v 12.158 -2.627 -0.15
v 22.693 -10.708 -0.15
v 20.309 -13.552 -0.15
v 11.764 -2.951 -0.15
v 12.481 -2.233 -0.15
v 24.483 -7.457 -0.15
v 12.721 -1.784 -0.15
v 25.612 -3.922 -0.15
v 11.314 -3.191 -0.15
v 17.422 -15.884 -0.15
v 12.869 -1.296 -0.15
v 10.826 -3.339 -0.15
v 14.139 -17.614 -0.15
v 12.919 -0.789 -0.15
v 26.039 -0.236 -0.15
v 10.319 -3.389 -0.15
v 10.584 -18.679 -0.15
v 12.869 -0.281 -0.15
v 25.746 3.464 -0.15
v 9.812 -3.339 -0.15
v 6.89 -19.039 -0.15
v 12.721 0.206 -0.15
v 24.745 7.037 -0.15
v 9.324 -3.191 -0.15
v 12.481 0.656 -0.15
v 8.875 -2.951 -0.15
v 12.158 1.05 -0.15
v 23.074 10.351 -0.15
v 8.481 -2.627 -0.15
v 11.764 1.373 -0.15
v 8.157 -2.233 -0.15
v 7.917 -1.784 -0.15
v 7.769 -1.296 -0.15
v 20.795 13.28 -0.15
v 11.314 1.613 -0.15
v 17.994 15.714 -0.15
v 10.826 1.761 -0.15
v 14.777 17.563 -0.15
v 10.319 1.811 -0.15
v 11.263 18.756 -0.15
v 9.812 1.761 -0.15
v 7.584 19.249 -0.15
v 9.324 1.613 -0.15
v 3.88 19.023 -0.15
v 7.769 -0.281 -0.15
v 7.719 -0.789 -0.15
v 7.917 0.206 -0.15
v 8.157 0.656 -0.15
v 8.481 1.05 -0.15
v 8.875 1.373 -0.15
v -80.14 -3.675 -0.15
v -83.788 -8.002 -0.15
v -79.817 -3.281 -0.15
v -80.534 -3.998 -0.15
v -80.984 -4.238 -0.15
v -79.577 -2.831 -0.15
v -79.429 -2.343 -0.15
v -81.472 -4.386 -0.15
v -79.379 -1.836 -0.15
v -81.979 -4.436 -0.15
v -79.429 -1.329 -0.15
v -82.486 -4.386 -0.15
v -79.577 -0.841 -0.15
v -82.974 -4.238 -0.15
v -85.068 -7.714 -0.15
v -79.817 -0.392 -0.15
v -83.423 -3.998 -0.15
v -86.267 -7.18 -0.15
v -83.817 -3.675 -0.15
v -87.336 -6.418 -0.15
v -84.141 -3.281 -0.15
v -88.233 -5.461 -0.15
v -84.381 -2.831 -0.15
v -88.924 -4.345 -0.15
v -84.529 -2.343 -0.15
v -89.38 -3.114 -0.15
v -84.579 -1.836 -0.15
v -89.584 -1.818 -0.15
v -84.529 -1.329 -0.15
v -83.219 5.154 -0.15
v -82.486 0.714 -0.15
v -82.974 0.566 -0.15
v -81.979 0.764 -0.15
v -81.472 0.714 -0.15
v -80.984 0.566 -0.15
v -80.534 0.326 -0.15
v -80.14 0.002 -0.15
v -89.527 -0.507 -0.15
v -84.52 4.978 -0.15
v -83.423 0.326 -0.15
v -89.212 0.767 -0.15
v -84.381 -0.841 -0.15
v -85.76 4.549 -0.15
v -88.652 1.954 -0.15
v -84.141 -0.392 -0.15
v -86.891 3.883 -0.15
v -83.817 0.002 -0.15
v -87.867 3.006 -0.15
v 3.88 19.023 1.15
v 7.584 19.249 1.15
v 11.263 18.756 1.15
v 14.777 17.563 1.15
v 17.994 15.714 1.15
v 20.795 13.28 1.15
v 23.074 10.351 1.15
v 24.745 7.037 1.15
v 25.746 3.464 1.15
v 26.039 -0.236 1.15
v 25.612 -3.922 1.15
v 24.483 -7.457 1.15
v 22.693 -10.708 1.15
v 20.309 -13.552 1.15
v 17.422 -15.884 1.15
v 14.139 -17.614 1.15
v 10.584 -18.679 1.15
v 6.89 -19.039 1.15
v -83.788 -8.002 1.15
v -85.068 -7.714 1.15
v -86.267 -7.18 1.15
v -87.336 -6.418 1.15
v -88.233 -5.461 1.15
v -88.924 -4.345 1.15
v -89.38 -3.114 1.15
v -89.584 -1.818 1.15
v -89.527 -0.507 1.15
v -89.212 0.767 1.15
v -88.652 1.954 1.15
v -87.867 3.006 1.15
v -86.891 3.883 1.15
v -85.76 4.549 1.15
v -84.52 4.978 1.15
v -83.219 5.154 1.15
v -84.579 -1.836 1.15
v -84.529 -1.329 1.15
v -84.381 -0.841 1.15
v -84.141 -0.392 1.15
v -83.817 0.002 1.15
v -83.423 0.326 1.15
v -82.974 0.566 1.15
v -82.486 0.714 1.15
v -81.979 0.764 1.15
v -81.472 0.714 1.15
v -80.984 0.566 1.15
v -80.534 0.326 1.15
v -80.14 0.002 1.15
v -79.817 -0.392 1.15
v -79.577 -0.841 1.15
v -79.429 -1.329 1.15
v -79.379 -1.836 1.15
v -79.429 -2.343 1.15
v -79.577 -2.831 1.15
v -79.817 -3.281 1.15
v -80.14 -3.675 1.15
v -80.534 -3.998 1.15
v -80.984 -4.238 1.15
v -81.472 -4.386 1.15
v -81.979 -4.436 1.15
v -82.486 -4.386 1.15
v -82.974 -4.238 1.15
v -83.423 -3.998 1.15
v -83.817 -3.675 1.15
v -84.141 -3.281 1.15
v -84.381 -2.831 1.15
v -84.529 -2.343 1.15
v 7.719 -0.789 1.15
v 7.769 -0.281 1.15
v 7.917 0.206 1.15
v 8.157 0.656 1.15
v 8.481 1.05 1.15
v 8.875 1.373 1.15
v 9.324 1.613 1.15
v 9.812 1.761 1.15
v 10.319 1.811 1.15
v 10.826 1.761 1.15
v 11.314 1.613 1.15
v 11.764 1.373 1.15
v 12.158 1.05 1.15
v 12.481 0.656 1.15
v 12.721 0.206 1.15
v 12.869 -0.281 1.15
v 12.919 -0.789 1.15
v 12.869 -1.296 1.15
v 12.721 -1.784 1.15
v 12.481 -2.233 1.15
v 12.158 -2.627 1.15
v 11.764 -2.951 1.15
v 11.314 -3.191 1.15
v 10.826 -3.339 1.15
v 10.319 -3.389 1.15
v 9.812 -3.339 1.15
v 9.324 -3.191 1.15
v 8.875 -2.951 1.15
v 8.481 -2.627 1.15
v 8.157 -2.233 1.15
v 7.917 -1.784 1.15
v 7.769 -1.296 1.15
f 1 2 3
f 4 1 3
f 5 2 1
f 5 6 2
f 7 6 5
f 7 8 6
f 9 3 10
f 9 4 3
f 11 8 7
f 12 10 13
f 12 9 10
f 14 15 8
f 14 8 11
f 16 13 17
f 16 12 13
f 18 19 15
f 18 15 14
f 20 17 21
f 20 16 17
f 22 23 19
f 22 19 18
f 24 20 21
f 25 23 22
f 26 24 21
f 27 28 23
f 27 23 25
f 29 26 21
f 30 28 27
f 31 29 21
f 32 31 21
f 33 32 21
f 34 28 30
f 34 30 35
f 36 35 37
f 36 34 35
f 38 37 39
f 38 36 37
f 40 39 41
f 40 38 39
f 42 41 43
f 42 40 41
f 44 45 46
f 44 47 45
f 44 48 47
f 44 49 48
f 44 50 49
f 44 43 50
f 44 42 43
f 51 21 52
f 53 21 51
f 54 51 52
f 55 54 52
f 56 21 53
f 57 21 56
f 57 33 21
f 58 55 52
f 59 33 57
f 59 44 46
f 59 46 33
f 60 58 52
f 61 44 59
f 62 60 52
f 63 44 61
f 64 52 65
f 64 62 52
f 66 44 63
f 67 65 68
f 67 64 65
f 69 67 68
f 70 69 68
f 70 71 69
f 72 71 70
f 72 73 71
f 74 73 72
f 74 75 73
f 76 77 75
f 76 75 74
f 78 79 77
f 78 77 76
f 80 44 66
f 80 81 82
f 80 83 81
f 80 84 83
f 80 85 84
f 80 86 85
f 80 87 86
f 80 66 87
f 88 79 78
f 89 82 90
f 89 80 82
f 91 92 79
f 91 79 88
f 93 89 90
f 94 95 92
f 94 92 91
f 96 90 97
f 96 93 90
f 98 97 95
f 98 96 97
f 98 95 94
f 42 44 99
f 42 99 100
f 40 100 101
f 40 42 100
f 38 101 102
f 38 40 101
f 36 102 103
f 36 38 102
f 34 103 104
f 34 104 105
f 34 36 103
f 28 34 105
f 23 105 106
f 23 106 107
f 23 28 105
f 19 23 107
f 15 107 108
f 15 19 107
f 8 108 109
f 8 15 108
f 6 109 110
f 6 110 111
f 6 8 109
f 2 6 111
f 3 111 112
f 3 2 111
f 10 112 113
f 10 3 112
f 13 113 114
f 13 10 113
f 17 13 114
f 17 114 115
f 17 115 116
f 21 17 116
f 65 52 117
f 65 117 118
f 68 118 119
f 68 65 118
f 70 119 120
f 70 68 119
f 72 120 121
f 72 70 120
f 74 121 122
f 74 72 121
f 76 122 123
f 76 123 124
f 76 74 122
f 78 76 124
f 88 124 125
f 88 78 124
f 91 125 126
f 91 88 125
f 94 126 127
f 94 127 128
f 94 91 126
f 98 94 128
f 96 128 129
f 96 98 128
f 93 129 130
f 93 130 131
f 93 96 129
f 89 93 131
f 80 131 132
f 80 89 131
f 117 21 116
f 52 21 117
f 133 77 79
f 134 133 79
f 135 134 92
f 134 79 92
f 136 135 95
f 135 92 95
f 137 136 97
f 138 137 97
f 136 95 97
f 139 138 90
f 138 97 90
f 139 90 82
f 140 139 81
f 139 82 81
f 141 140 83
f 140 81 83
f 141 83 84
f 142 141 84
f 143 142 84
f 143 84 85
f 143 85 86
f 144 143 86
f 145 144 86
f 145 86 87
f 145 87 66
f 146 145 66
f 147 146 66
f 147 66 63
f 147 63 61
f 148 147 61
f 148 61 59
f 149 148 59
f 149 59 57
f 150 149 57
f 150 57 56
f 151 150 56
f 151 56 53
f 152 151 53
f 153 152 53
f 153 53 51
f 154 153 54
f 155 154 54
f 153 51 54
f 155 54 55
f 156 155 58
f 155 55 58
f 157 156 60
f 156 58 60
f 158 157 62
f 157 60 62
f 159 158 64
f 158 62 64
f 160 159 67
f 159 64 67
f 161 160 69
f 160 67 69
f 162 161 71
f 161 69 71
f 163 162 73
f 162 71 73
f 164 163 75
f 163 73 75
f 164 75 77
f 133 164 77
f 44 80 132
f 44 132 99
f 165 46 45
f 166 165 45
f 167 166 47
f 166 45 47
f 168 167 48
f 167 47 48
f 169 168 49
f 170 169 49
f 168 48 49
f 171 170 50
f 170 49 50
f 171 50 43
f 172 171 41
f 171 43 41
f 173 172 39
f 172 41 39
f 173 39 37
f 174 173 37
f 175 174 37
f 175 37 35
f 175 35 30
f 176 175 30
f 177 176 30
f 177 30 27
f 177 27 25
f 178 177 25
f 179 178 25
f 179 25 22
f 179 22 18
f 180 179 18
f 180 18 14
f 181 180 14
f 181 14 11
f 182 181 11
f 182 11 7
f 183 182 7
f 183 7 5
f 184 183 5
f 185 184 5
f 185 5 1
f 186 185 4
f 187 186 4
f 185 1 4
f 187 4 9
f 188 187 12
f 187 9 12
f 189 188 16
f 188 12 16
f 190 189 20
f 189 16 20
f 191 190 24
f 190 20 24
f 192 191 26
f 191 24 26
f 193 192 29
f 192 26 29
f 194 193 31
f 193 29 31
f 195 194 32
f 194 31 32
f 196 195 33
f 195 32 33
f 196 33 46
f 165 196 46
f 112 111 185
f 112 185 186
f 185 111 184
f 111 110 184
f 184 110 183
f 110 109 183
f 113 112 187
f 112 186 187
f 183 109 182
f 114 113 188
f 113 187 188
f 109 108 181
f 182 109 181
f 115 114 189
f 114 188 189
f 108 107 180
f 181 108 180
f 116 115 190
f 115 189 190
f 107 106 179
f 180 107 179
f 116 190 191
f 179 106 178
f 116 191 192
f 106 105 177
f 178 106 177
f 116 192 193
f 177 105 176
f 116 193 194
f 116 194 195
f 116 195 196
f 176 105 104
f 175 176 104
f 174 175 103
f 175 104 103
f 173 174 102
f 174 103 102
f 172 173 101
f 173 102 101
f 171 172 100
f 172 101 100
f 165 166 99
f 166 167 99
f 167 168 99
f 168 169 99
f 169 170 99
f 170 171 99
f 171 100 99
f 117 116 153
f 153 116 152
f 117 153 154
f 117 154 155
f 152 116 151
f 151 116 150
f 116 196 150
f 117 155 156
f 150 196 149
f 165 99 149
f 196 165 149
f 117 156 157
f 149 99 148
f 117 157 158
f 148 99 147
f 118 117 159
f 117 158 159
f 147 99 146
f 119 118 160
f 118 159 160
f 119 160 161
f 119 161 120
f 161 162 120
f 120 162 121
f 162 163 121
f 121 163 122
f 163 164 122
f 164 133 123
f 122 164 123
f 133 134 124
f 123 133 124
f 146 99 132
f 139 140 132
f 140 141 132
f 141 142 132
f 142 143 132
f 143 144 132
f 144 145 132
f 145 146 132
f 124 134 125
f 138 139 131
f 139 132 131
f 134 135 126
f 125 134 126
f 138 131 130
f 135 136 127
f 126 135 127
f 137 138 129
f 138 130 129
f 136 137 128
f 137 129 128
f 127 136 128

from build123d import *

# Parameters (mm, degrees)
BOSS_EXTRUDE1_DEPTH = 1
SKETCH2_R           = 2.000000064
CUT_EXTRUDE1_DEPTH  = 2.54
SCALE1_SCALE        = 1.3


with BuildPart() as part:
    # Sketch1 → Boss-Extrude1 (new body)
    with BuildSketch(Plane.XY):
        with BuildLine():
            Line((-69.316067153, 3.878962407), (-2.316488686, 14.547627491))
            ThreePointArc((-2.316488686, 14.547627491), (14.685052241, 1.161389736), (-0.000951264, -14.730905761))
            Line((-0.000951264, -14.730905761), (-69.753484787, -6.240756815))
            ThreePointArc((-69.753484787, -6.240756815), (-74.214947759, -0.978600121), (-69.316067153, 3.878962407))
        make_face()
    extrude(amount=BOSS_EXTRUDE1_DEPTH)

    # Sketch2 → Cut-Extrude1 (cut)
    with BuildSketch(Plane(origin=(0, 0, 0), x_dir=(-1, 0, 0), z_dir=(0, 0, -1))):
        with Locations((-2.636515213, -0.692372509)):
            Circle(SKETCH2_R)
        with Locations((68.361932579, -1.498185023)):
            Circle(SKETCH2_R)
    extrude(amount=-CUT_EXTRUDE1_DEPTH, mode=Mode.SUBTRACT)


with BuildPart() as part_1:
    # Scale1: scaled about (-22.971903001, -0.371312975, 0.5)
    add(part.part.scale(SCALE1_SCALE).moved(Location((6.8915709, 0.111393893, -0.15))))


solid = part_1.part
